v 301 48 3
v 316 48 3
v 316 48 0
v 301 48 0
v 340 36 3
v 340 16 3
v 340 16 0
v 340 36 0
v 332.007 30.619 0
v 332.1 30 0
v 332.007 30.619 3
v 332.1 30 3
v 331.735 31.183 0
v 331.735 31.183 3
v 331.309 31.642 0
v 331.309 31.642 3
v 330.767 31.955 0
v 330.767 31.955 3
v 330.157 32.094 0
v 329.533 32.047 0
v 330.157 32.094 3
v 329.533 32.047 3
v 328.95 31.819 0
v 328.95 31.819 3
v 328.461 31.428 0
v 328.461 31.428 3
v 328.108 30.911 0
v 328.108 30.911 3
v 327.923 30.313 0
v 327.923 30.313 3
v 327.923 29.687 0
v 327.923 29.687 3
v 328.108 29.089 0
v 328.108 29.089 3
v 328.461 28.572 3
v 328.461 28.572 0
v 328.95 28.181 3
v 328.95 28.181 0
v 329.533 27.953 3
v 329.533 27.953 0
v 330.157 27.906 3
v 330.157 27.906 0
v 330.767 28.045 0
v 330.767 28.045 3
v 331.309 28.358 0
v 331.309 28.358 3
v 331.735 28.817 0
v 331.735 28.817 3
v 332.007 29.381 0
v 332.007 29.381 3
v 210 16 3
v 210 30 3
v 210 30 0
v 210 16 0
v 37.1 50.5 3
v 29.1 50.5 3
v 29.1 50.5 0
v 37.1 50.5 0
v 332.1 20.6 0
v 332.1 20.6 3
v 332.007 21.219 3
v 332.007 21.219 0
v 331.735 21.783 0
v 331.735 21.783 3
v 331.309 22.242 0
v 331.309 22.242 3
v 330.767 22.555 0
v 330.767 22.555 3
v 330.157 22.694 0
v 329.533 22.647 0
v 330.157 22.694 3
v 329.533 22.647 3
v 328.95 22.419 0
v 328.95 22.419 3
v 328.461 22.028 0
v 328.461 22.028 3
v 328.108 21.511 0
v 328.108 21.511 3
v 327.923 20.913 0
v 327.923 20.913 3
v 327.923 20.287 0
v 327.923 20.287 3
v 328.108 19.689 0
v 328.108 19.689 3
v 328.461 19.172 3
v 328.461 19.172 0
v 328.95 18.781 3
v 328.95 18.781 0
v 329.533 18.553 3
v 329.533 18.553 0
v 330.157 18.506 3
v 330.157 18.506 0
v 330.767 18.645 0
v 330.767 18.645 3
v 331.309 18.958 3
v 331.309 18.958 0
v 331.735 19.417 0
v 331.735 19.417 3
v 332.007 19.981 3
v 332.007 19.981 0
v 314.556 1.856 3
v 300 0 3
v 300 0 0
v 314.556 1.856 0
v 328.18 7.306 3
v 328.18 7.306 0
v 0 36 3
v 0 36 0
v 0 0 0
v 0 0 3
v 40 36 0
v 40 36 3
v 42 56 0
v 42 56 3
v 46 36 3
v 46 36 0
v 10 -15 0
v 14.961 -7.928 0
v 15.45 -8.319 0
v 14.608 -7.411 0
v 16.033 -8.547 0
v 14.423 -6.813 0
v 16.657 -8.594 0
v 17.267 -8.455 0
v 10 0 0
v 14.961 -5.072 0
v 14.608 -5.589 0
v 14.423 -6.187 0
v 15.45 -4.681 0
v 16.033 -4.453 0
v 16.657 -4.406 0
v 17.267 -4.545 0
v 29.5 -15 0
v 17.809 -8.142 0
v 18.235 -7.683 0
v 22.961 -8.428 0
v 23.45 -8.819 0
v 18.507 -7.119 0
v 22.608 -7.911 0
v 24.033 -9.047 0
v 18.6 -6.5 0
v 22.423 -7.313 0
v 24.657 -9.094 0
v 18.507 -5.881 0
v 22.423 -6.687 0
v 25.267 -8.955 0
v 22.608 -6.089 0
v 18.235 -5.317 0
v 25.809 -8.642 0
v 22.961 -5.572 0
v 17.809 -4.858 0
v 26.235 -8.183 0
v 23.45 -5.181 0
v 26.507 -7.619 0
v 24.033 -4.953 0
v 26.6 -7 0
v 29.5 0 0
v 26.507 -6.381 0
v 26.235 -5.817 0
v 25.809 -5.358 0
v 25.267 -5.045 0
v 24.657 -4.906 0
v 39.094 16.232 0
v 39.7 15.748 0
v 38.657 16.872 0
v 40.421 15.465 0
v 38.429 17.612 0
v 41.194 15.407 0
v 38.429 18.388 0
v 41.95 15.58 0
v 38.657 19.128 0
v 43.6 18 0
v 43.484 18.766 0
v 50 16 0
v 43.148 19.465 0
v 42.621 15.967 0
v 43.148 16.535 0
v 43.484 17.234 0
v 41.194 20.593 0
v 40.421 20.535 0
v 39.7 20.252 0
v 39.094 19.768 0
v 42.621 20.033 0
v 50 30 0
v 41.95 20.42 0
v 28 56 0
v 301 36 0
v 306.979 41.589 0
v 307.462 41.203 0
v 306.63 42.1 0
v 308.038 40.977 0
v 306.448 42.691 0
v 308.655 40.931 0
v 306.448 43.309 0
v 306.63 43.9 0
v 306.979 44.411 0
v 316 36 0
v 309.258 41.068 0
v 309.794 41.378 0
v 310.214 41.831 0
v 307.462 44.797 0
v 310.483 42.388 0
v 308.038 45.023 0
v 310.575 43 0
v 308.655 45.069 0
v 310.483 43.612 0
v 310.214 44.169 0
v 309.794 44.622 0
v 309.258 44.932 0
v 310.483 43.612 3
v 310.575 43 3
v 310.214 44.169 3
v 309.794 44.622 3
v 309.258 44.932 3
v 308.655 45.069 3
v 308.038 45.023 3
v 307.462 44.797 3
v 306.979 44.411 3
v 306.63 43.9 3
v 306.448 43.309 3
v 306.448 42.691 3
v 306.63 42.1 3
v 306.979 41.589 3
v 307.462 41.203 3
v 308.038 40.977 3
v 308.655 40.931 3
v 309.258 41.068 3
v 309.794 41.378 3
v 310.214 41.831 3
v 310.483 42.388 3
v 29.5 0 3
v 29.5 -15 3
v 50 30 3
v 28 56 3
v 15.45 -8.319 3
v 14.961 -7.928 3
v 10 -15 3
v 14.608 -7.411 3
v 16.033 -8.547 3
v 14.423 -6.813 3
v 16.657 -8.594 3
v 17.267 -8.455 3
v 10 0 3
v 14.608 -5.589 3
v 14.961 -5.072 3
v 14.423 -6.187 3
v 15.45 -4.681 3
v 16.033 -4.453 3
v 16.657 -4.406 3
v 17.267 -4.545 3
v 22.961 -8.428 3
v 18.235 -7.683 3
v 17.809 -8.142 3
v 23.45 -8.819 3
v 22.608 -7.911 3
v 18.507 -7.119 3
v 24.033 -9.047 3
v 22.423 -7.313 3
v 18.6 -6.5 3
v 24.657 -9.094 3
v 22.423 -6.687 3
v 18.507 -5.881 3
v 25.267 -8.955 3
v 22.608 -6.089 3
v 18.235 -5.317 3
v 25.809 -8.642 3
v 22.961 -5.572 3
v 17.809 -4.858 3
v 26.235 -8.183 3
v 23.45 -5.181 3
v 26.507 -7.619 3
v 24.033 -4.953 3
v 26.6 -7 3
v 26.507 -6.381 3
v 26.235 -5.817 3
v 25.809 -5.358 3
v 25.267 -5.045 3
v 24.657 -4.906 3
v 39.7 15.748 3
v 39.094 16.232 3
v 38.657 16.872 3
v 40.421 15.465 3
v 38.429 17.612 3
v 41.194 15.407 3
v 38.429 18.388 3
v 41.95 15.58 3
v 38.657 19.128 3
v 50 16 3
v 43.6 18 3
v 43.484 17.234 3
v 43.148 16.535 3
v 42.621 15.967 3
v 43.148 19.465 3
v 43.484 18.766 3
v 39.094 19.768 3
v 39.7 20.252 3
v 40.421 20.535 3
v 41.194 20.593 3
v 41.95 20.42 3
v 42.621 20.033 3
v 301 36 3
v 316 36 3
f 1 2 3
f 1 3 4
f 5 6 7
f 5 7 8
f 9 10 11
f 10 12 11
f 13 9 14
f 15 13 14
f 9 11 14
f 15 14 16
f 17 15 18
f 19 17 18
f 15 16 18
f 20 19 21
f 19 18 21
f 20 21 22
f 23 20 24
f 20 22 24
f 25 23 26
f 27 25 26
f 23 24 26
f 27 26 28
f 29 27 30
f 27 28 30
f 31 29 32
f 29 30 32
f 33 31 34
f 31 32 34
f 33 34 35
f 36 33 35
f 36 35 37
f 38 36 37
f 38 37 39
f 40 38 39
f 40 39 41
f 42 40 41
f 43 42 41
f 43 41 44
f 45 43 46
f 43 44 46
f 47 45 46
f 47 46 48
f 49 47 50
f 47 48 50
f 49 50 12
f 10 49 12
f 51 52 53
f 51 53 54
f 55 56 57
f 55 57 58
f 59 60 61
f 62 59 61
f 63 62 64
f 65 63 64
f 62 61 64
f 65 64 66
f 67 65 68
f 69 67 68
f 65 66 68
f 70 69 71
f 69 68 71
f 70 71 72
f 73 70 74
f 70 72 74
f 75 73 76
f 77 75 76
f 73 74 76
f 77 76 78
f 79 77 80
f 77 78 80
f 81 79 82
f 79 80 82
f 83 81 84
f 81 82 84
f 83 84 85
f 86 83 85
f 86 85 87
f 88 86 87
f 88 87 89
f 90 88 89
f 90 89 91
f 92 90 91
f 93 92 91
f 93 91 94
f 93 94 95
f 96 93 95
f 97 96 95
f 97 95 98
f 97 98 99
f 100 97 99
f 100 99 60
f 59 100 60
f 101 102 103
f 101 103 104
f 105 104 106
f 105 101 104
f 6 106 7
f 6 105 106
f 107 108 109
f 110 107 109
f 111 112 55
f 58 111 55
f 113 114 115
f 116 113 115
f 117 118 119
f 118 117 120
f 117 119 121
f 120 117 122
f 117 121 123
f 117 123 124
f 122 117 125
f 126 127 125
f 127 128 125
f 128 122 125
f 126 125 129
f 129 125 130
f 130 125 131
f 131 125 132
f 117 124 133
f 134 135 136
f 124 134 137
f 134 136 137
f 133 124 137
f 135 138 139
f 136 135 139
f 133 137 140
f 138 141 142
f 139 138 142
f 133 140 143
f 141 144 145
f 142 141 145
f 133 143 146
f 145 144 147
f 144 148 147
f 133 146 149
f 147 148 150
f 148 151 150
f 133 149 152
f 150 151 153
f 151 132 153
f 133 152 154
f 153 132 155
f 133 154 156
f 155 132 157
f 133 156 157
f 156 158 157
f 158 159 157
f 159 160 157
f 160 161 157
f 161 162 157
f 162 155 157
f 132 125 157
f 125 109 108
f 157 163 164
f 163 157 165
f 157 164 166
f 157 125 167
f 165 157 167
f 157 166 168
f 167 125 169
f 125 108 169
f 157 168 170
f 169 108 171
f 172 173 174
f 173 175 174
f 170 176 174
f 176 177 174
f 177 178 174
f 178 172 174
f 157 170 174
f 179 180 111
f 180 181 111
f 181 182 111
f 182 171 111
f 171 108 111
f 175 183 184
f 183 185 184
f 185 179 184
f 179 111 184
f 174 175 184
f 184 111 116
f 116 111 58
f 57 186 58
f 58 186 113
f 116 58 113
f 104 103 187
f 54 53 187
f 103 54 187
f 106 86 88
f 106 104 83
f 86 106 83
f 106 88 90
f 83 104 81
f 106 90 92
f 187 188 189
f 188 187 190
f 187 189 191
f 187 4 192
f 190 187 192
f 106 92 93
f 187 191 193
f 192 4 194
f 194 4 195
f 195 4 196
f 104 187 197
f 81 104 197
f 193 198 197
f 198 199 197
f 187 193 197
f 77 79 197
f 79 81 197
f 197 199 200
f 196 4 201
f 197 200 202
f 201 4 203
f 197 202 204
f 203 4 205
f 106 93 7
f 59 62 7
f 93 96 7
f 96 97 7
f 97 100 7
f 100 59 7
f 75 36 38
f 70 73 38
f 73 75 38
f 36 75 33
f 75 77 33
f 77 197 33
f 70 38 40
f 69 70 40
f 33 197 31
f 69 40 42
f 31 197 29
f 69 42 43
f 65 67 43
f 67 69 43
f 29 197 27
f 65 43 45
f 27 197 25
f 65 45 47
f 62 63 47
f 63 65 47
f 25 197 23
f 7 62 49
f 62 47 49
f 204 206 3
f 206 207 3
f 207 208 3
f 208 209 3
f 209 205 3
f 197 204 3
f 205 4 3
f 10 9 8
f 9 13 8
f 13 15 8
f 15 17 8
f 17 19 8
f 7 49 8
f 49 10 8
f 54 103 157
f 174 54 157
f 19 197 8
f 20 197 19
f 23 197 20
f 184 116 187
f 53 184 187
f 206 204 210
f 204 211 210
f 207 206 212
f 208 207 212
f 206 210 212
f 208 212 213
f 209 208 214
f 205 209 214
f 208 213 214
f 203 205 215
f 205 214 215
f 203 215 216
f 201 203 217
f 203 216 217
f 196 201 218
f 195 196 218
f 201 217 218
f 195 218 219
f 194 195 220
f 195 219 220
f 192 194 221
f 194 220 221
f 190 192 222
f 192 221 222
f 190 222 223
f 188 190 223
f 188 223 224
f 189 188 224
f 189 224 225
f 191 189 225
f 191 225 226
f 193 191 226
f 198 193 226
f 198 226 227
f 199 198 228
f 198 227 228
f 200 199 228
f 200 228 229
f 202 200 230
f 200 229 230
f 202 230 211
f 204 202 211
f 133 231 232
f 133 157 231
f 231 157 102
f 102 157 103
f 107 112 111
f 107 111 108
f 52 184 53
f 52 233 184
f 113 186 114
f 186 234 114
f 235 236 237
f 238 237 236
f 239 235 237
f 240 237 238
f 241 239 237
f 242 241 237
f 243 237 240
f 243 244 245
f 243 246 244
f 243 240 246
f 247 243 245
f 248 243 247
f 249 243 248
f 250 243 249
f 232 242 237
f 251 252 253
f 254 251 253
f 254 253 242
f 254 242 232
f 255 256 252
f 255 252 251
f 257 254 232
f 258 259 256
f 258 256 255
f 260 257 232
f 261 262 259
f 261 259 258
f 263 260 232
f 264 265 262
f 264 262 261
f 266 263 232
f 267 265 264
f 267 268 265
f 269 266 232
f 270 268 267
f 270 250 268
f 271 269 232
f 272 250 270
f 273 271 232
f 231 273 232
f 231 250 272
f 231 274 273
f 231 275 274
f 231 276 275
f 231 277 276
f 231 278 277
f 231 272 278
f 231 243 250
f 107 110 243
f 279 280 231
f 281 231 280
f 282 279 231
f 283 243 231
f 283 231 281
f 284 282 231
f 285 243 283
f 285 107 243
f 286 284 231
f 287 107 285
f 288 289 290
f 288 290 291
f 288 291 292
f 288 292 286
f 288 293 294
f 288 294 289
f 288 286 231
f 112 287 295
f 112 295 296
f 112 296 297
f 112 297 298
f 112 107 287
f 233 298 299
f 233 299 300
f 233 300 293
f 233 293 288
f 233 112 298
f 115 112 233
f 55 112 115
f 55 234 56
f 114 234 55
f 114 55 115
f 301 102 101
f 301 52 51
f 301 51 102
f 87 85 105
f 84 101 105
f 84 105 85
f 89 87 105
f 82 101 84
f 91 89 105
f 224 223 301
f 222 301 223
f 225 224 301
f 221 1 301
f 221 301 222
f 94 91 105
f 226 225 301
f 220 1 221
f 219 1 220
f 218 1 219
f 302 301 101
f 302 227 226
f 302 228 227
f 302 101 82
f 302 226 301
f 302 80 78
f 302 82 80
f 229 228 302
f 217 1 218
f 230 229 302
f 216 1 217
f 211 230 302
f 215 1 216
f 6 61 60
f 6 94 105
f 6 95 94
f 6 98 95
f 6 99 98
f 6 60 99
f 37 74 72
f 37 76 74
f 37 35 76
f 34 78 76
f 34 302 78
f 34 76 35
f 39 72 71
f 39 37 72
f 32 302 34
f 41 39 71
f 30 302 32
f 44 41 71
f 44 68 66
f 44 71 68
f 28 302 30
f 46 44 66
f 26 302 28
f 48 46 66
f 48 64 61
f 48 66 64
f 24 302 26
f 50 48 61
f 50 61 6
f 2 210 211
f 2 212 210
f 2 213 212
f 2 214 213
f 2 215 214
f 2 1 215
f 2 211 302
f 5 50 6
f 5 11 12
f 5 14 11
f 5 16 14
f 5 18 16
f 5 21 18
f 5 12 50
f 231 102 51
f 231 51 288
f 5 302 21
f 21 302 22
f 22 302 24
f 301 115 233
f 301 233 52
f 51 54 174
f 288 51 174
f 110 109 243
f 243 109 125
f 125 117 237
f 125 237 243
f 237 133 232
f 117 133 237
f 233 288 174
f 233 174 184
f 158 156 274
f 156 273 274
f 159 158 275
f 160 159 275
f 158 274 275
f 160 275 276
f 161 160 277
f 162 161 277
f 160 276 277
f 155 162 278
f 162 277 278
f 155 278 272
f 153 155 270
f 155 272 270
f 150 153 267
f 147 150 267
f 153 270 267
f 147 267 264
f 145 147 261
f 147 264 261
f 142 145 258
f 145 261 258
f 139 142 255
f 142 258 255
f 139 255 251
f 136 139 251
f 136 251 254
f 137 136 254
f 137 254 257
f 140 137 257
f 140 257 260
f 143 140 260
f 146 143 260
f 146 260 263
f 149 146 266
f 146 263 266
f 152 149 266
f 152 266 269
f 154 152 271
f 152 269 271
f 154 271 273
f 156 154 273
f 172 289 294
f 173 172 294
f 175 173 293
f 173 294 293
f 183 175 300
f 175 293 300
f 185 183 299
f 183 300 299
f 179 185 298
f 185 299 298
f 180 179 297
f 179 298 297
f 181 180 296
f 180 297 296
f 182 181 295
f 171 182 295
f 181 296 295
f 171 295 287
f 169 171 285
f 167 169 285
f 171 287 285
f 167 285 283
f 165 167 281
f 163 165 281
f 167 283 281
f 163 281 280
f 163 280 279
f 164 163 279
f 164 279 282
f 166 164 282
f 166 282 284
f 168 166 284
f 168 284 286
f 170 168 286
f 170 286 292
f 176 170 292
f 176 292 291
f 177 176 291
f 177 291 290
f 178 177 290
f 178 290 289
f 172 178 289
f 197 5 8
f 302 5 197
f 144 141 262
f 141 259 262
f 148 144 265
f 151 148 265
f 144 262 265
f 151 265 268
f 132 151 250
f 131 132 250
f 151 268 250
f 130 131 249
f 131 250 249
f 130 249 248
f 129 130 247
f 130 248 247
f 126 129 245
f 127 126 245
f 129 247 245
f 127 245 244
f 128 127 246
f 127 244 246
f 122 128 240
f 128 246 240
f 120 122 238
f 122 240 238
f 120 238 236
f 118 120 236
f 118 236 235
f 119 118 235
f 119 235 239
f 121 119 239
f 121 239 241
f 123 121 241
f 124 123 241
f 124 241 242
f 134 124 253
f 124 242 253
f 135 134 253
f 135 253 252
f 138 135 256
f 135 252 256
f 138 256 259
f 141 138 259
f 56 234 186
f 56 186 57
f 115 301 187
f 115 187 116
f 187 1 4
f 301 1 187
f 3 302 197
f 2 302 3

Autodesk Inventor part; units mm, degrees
ref_plane "YZ Plane" through (0, 0, 0) normal (1, 0, 0) x (0, 1, 0)
ref_plane "XZ Plane" through (0, 0, 0) normal (0, 1, 0) x (-1, 0, 0)
ref_plane "XY Plane" through (0, 0, 0) normal (0, 0, 1) x (1, 0, 0)
sketch "Sketch1" plane through (0, 0, 0) normal (0, 0, 1) x (1, 0, 0)
  line L0 (0, 0) -> (300, 0)
  line L1 (300, 0) -> (300, 16)
  line L2 (300, 16) -> (0, 16)
  line L3 (0, 16) -> (0, 0)
  line L4 (0, 0) -> (22.0483, 0)
  line L5 (10, 0) -> (29.5, 0)
  line L6 (29.5, 0) -> (29.5, -15)
  line L7 (29.5, -15) -> (10, -15)
  line L8 (10, -15) -> (10, 0)
  point P0 (0, 8)
  dimension "d2" = 19.5
  dimension "d3" = 15
  dimension "d4" = 10
  dimension "d5" = 16
  dimension "d8" = 300
extrude "Extrusion1" add sketch "Sketch1" along normal blind 3
sketch "Sketch2" plane through (0, 0, 3) normal (0, 0, 1) x (1, 0, 0)
  line L0 (0, 16) -> (0, 0) projected
  line L1 (0, 16) -> (0, 36)
  line L2 (300, 0) -> (300, 16) projected
  line L3 (340, 16) -> (340, 36)
  line L4 (340, 36) -> (0, 36)
  line L5 (300, 16) -> (0, 16) projected
  line L6 (50, 16) -> (50, 30)
  line L7 (50, 30) -> (210, 30)
  line L8 (210, 30) -> (210, 16)
  line L9 (40, 36) -> (36, 56)
  line L10 (36, 56) -> (42, 56)
  line L11 (42, 56) -> (46, 36)
  circle A0 centre (330, 30) radius 2.1
  circle A1 centre (330, 20.6) radius 2.1
  line L12 (340, 16) -> (300, 16)
  line L13 (301, 36) -> (316, 36)
  line L14 (316, 36) -> (316, 48)
  line L15 (316, 48) -> (301, 48)
  line L16 (301, 48) -> (301, 36)
  circle A2 centre (308.5, 43) radius 2.075
  line L17 (36, 56) -> (28, 56)
  line L18 (28, 56) -> (29.1, 50.5)
  line L19 (29.1, 50.5) -> (37.1, 50.5)
  point P0 (308.5, 48)
  point P1 (316, 36)
  dimension "d44" = 20
  dimension "d45" = 160
  dimension "d46" = 50
  dimension "d47" = 14
  dimension "d48" = 20
  dimension "d49" = 6
  dimension "d50" = 4
  dimension "d51" = 40
  dimension "d83" = 4.2
  dimension "d84" = 4.2
  dimension "d85" = 6
  dimension "d86" = 9.4
  dimension "d87" = 10
  dimension "d99" = 40
  dimension "d107" = 7
  dimension "d108" = 15
  dimension "d109" = 12
  dimension "d110" = 24
  dimension "d111" = 4.15
  dimension "d112" = 8
  dimension "d114" = 5.5
extrude "Extrusion2" add sketch "Sketch2" against normal blind 3 contours L1 L4 L3 L12 L5 L8 L7 L6 | L9 L10 L11 L4 | L19 L18 L17 L9 | L16 L15 L14 L4
sketch "Sketch3" plane through (0, 0, 3) normal (0, 0, 1) x (1, 0, 0)
  circle A0 centre (16.5, -6.5) radius 2.1
  circle A1 centre (24.5, -7) radius 2.1
  line L0 (29.5, 0) -> (300, 0) projected
  line L1 (29.5, -15) -> (29.5, 0) projected
  point P0 (0, 0)
  dimension "d75" = 4.2
  dimension "d76" = 6.5
  dimension "d77" = 4.2
  dimension "d78" = 7
  dimension "d79" = 5
  dimension "d80" = 8
extrude "Extrusion3" cut sketch "Sketch3" against normal blind 3
sketch "Sketch4" plane through (0, 0, 3) normal (0, 0, 1) x (1, 0, 0)
  line L0 (29.5, 0) -> (300, 0) projected
  circle A0 centre (41, 18) radius 2.6
  line L1 (340, 36) -> (46, 36) projected
  line L2 (38.4, 28.1) -> (43.6, 28.1)
  line L3 (43.6, 28.1) -> (43.6, 7.9)
  line L4 (43.6, 7.9) -> (38.4, 7.9)
  line L5 (38.4, 7.9) -> (38.4, 28.1)
  line L6 (38.4, 28.1) -> (43.6, 7.9) construction
  line L7 (43.6, 28.1) -> (38.4, 7.9) construction
  point P0 (0, 0)
  point P1 (43.6, 18)
  point P2 (38.4, 18)
  dimension "d95" = 18
  dimension "d96" = 5.2
  dimension "d100" = 5
  dimension "d101" = 20.2
extrude "Extrusion4" cut sketch "Sketch4" against normal blind 3 contours A0
sketch "Sketch5" plane through (0, 0, 3) normal (0, 0, 1) x (1, 0, 0)
  line L0 (29.5, 0) -> (300, 0) projected
  line L1 (340, 36) -> (340, 16) projected
  arc A0 (300, 0) -> (340, 16) centre (300, 58) ccw
  line L2 (300, 0) -> (300, 16) projected
  line L3 (300, 0) -> (300, 16)
  line L4 (300, 16) -> (340, 16)
  point P0 (0, 0)
extrude "Extrusion5" add sketch "Sketch5" against normal blind 3
properties part number "Middle_bar"
